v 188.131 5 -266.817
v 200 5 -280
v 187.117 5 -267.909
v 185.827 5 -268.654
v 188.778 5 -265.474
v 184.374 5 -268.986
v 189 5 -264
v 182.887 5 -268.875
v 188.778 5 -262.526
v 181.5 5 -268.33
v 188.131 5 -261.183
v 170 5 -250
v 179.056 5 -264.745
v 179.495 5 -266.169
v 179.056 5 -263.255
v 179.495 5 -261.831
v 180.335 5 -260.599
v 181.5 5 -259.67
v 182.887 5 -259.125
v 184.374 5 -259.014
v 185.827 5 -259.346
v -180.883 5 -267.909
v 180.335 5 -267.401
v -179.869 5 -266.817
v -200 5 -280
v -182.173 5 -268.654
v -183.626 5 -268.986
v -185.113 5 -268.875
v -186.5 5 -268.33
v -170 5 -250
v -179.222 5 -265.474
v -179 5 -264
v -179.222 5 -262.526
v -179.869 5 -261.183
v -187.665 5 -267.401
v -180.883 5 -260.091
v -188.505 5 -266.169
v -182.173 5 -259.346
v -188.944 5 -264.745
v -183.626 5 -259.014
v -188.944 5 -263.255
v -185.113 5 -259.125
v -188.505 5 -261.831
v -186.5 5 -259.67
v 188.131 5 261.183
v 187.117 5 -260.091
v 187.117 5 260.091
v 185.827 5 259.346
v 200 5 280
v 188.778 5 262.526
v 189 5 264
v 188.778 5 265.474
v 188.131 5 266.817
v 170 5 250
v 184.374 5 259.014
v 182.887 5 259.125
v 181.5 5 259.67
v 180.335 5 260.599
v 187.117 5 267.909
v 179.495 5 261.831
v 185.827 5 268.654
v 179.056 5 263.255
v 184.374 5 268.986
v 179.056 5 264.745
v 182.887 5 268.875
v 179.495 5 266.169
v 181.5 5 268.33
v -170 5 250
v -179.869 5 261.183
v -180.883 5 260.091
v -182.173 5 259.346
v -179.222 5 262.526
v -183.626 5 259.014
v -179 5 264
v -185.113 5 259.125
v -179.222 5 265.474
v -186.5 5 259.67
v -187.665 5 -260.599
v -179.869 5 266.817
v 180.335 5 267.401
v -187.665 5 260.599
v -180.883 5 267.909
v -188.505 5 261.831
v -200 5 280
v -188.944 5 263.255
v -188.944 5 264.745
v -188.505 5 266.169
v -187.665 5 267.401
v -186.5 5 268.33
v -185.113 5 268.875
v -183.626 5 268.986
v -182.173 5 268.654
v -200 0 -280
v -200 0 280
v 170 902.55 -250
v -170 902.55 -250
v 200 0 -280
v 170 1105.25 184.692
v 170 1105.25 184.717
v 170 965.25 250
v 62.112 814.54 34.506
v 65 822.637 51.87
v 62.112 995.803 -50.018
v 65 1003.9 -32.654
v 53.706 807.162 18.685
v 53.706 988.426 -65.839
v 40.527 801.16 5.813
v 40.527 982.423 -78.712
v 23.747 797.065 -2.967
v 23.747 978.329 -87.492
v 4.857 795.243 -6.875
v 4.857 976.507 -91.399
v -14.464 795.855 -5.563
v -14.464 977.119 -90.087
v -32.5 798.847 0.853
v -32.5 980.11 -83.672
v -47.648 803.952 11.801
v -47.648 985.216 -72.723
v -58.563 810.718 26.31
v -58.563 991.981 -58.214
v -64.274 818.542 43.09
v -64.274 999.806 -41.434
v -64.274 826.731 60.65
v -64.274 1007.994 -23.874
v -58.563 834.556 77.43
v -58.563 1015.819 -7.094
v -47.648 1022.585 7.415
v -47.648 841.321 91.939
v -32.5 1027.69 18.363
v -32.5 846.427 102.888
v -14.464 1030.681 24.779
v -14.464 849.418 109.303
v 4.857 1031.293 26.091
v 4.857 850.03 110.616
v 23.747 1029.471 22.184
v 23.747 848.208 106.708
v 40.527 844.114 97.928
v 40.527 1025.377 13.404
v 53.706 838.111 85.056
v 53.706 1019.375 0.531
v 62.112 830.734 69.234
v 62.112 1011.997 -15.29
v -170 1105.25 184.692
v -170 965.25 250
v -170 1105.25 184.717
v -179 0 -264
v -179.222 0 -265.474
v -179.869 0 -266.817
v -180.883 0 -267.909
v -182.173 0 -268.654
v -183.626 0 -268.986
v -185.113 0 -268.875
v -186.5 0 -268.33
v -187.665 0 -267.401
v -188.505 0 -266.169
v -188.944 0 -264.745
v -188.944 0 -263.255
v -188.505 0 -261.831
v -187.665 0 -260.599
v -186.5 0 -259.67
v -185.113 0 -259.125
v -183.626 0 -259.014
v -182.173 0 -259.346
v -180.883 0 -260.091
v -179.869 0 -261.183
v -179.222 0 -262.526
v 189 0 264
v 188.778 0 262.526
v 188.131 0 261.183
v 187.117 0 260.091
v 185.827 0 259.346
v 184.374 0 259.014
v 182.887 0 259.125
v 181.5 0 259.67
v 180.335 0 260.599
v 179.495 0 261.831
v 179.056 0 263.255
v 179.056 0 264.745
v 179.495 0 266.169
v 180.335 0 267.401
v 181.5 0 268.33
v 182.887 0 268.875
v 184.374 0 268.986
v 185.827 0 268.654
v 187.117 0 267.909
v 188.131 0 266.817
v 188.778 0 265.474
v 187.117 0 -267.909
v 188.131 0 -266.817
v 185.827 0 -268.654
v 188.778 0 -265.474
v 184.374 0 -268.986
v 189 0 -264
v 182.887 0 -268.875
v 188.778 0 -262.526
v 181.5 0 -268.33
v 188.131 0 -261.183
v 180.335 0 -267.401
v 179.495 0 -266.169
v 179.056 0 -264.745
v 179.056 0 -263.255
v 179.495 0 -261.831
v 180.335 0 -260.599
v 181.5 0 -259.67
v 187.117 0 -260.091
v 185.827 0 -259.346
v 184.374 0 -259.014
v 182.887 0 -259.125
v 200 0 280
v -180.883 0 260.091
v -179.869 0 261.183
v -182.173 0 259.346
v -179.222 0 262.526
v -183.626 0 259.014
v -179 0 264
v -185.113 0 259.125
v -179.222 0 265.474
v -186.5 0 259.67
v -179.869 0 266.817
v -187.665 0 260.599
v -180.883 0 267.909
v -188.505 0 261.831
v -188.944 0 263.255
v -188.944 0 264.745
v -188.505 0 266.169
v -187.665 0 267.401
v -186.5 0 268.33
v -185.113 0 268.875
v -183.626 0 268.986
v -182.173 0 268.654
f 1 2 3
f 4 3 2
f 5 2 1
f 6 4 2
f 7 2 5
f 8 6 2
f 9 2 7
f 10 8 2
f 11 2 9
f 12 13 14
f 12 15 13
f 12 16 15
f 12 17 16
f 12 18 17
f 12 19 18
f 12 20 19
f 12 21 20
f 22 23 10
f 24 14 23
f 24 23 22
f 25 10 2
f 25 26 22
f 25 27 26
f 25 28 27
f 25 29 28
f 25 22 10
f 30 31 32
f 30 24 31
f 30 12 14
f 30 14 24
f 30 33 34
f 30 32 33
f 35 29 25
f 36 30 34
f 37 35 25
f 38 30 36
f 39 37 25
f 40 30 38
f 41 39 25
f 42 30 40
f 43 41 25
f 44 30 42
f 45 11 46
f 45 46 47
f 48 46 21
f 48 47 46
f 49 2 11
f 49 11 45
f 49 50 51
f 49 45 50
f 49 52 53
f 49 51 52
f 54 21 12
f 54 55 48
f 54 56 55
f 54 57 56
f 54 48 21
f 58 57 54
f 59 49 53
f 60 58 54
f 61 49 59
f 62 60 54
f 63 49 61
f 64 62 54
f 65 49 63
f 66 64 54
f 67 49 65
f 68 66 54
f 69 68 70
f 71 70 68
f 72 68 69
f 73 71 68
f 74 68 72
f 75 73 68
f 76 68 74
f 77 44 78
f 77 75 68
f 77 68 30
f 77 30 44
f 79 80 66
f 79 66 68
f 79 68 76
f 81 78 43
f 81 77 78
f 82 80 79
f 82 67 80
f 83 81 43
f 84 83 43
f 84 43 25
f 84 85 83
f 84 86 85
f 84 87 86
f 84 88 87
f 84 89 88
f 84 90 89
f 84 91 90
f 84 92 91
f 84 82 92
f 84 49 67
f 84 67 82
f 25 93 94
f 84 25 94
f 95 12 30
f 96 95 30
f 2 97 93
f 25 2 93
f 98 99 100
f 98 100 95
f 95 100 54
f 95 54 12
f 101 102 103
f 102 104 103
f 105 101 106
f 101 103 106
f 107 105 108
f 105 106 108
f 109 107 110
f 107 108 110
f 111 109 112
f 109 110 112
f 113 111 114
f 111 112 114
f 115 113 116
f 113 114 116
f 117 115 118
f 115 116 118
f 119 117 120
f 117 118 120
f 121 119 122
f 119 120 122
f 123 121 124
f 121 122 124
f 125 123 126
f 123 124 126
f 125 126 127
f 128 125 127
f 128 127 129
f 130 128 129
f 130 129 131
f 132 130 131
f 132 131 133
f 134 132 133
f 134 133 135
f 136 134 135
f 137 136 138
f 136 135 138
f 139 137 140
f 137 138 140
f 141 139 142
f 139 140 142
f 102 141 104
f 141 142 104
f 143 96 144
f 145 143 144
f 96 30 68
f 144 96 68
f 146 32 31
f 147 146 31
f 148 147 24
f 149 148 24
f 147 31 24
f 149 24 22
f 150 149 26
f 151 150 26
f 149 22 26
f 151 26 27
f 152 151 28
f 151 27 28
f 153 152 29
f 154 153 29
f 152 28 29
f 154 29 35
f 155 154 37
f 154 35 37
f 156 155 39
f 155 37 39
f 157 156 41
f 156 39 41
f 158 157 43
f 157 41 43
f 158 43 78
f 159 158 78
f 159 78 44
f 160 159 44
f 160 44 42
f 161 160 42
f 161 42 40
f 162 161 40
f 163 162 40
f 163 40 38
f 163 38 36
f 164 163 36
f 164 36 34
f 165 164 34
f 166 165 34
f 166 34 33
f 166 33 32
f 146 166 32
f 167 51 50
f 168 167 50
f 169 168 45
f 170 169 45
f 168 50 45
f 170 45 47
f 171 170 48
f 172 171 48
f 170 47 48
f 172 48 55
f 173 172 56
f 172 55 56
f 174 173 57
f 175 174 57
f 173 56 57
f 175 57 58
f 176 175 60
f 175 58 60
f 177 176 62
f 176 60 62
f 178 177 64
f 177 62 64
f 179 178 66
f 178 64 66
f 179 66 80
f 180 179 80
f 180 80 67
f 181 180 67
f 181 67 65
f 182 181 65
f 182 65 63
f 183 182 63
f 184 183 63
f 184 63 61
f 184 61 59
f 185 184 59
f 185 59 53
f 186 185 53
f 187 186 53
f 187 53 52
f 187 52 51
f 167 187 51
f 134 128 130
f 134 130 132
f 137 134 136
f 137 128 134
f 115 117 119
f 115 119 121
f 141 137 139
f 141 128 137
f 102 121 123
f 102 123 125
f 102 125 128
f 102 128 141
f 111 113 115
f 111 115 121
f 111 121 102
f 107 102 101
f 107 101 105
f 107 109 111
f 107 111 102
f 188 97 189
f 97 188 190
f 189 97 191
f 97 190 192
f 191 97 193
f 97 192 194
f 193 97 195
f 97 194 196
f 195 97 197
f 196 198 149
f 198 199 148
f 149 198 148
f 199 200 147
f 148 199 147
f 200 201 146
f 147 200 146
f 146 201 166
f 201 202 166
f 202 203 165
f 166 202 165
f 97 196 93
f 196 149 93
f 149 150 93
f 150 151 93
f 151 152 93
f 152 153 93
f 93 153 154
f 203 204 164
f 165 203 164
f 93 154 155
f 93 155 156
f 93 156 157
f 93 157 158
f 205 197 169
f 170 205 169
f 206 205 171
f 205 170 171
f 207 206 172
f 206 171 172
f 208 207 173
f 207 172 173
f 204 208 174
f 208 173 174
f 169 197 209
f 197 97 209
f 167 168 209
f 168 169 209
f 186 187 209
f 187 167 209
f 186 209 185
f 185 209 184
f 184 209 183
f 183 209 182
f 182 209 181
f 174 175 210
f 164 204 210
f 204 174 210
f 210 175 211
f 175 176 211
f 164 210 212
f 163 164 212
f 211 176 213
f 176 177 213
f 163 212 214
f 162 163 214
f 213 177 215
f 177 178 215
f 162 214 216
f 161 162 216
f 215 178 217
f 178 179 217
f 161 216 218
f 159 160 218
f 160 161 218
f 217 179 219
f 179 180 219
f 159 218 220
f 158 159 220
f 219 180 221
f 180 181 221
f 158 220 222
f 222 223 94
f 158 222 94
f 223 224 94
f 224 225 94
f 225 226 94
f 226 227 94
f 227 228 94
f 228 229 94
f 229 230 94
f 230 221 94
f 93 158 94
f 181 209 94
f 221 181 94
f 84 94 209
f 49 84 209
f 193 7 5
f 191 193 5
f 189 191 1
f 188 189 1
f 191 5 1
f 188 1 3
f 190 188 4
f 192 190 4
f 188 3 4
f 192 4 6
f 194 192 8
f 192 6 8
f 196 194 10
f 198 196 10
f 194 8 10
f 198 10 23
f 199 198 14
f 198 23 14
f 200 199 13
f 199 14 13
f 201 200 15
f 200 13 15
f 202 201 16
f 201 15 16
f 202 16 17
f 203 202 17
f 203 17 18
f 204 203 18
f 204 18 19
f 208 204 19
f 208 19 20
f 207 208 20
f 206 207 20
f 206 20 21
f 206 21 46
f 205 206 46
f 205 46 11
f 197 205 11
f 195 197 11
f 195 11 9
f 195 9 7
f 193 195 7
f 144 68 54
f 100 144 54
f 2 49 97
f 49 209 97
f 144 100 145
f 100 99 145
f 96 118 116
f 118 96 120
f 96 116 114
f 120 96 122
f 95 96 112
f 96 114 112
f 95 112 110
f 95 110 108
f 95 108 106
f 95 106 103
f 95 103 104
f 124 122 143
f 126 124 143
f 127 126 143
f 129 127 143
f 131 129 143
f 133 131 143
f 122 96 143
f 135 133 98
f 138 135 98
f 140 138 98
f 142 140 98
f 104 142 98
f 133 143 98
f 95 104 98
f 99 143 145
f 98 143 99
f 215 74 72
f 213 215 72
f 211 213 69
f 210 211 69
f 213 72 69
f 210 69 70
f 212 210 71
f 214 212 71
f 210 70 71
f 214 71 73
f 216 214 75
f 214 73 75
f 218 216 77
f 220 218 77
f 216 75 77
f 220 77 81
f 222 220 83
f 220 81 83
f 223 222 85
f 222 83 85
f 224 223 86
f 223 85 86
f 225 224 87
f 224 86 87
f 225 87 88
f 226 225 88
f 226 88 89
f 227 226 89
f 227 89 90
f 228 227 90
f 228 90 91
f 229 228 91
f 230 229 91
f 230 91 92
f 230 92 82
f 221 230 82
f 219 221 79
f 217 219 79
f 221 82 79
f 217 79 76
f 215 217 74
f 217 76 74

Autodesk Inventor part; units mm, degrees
ref_plane "YZ Plane" through (0, 0, 0) normal (1, 0, 0) x (0, 1, 0)
ref_plane "XZ Plane" through (0, 0, 0) normal (0, 1, 0) x (-1, 0, 0)
ref_plane "XY Plane" through (0, 0, 0) normal (0, 0, 1) x (1, 0, 0)
sketch "Sketch1" plane through (0, 0, 0) normal (0, 1, 0) x (-1, 0, 0)
  line L0 (200, 280) -> (-200, 280)
  line L1 (-200, 280) -> (-200, -280)
  line L2 (-200, -280) -> (200, -280)
  line L3 (200, -280) -> (200, 280)
  line L4 (200, 280) -> (-200, -280) construction
  line L5 (-200, 280) -> (200, -280) construction
  point P0 (0, 0)
extrude "Base" add sketch "Sketch1" along normal blind 5
sketch "Sketch3" plane through (0, 5, 0) normal (0, 1, 0) x (1, 0, 0)
  line L0 (-170, -250) -> (170, -250)
  line L1 (170, -250) -> (170, 250)
  line L2 (170, 250) -> (-170, 250)
  line L3 (-170, 250) -> (-170, -250)
  line L4 (-170, -250) -> (170, 250) construction
  line L5 (170, -250) -> (-170, 250) construction
  point P0 (0, 0)
extrude "Stand" add sketch "Sketch3" along normal blind 900
move faces "Move2" translate (0, 200.25, 0) faces at (56.6667, 905, 83.3333)
chamfer "FrontChamfer" distance 140 angle 25 1 edges at (0, 1105.25, 250) measured on face at (-56.6667, 371.75, 250)
chamfer "BeamHoleFace" distance 202.7 angle 65 1 edges at (0, 1105.25, -250) measured on face at (56.6667, 371.75, -250)
sketch "Sketch5" plane through (-170, 1105.25, 184.6916) normal (0, 0.9063078, -0.4226183) x (1, 0, 0)
  circle A0 centre (170, 239.8145) radius 65
  point P0 (170, 634.4862)
  point P1 (170, 240)
  point P2 (170, 240)
  point P3 (203, 347)
  point P4 (170, 240)
extrude "BeamHole" cut sketch "Sketch5" against normal blind 200
sketch "Sketch6" plane through (0, 5, 0) normal (0, 1, 0) x (1, 0, 0)
  circle A0 centre (-184, -264) radius 5
  circle A1 centre (184, -264) radius 5
  line L0 (200, -280) -> (200, 280) construction
  line L1 (200, 0) -> (-200, 0) construction
  line L2 (-200, 280) -> (-200, -280) construction
  circle A2 centre (-184, 264) radius 5
  circle A3 centre (184, 264) radius 5
  point P0 (0, 0)
extrude "BaseBoltHoles" cut sketch "Sketch6" against normal up to next
properties part number "Base"
